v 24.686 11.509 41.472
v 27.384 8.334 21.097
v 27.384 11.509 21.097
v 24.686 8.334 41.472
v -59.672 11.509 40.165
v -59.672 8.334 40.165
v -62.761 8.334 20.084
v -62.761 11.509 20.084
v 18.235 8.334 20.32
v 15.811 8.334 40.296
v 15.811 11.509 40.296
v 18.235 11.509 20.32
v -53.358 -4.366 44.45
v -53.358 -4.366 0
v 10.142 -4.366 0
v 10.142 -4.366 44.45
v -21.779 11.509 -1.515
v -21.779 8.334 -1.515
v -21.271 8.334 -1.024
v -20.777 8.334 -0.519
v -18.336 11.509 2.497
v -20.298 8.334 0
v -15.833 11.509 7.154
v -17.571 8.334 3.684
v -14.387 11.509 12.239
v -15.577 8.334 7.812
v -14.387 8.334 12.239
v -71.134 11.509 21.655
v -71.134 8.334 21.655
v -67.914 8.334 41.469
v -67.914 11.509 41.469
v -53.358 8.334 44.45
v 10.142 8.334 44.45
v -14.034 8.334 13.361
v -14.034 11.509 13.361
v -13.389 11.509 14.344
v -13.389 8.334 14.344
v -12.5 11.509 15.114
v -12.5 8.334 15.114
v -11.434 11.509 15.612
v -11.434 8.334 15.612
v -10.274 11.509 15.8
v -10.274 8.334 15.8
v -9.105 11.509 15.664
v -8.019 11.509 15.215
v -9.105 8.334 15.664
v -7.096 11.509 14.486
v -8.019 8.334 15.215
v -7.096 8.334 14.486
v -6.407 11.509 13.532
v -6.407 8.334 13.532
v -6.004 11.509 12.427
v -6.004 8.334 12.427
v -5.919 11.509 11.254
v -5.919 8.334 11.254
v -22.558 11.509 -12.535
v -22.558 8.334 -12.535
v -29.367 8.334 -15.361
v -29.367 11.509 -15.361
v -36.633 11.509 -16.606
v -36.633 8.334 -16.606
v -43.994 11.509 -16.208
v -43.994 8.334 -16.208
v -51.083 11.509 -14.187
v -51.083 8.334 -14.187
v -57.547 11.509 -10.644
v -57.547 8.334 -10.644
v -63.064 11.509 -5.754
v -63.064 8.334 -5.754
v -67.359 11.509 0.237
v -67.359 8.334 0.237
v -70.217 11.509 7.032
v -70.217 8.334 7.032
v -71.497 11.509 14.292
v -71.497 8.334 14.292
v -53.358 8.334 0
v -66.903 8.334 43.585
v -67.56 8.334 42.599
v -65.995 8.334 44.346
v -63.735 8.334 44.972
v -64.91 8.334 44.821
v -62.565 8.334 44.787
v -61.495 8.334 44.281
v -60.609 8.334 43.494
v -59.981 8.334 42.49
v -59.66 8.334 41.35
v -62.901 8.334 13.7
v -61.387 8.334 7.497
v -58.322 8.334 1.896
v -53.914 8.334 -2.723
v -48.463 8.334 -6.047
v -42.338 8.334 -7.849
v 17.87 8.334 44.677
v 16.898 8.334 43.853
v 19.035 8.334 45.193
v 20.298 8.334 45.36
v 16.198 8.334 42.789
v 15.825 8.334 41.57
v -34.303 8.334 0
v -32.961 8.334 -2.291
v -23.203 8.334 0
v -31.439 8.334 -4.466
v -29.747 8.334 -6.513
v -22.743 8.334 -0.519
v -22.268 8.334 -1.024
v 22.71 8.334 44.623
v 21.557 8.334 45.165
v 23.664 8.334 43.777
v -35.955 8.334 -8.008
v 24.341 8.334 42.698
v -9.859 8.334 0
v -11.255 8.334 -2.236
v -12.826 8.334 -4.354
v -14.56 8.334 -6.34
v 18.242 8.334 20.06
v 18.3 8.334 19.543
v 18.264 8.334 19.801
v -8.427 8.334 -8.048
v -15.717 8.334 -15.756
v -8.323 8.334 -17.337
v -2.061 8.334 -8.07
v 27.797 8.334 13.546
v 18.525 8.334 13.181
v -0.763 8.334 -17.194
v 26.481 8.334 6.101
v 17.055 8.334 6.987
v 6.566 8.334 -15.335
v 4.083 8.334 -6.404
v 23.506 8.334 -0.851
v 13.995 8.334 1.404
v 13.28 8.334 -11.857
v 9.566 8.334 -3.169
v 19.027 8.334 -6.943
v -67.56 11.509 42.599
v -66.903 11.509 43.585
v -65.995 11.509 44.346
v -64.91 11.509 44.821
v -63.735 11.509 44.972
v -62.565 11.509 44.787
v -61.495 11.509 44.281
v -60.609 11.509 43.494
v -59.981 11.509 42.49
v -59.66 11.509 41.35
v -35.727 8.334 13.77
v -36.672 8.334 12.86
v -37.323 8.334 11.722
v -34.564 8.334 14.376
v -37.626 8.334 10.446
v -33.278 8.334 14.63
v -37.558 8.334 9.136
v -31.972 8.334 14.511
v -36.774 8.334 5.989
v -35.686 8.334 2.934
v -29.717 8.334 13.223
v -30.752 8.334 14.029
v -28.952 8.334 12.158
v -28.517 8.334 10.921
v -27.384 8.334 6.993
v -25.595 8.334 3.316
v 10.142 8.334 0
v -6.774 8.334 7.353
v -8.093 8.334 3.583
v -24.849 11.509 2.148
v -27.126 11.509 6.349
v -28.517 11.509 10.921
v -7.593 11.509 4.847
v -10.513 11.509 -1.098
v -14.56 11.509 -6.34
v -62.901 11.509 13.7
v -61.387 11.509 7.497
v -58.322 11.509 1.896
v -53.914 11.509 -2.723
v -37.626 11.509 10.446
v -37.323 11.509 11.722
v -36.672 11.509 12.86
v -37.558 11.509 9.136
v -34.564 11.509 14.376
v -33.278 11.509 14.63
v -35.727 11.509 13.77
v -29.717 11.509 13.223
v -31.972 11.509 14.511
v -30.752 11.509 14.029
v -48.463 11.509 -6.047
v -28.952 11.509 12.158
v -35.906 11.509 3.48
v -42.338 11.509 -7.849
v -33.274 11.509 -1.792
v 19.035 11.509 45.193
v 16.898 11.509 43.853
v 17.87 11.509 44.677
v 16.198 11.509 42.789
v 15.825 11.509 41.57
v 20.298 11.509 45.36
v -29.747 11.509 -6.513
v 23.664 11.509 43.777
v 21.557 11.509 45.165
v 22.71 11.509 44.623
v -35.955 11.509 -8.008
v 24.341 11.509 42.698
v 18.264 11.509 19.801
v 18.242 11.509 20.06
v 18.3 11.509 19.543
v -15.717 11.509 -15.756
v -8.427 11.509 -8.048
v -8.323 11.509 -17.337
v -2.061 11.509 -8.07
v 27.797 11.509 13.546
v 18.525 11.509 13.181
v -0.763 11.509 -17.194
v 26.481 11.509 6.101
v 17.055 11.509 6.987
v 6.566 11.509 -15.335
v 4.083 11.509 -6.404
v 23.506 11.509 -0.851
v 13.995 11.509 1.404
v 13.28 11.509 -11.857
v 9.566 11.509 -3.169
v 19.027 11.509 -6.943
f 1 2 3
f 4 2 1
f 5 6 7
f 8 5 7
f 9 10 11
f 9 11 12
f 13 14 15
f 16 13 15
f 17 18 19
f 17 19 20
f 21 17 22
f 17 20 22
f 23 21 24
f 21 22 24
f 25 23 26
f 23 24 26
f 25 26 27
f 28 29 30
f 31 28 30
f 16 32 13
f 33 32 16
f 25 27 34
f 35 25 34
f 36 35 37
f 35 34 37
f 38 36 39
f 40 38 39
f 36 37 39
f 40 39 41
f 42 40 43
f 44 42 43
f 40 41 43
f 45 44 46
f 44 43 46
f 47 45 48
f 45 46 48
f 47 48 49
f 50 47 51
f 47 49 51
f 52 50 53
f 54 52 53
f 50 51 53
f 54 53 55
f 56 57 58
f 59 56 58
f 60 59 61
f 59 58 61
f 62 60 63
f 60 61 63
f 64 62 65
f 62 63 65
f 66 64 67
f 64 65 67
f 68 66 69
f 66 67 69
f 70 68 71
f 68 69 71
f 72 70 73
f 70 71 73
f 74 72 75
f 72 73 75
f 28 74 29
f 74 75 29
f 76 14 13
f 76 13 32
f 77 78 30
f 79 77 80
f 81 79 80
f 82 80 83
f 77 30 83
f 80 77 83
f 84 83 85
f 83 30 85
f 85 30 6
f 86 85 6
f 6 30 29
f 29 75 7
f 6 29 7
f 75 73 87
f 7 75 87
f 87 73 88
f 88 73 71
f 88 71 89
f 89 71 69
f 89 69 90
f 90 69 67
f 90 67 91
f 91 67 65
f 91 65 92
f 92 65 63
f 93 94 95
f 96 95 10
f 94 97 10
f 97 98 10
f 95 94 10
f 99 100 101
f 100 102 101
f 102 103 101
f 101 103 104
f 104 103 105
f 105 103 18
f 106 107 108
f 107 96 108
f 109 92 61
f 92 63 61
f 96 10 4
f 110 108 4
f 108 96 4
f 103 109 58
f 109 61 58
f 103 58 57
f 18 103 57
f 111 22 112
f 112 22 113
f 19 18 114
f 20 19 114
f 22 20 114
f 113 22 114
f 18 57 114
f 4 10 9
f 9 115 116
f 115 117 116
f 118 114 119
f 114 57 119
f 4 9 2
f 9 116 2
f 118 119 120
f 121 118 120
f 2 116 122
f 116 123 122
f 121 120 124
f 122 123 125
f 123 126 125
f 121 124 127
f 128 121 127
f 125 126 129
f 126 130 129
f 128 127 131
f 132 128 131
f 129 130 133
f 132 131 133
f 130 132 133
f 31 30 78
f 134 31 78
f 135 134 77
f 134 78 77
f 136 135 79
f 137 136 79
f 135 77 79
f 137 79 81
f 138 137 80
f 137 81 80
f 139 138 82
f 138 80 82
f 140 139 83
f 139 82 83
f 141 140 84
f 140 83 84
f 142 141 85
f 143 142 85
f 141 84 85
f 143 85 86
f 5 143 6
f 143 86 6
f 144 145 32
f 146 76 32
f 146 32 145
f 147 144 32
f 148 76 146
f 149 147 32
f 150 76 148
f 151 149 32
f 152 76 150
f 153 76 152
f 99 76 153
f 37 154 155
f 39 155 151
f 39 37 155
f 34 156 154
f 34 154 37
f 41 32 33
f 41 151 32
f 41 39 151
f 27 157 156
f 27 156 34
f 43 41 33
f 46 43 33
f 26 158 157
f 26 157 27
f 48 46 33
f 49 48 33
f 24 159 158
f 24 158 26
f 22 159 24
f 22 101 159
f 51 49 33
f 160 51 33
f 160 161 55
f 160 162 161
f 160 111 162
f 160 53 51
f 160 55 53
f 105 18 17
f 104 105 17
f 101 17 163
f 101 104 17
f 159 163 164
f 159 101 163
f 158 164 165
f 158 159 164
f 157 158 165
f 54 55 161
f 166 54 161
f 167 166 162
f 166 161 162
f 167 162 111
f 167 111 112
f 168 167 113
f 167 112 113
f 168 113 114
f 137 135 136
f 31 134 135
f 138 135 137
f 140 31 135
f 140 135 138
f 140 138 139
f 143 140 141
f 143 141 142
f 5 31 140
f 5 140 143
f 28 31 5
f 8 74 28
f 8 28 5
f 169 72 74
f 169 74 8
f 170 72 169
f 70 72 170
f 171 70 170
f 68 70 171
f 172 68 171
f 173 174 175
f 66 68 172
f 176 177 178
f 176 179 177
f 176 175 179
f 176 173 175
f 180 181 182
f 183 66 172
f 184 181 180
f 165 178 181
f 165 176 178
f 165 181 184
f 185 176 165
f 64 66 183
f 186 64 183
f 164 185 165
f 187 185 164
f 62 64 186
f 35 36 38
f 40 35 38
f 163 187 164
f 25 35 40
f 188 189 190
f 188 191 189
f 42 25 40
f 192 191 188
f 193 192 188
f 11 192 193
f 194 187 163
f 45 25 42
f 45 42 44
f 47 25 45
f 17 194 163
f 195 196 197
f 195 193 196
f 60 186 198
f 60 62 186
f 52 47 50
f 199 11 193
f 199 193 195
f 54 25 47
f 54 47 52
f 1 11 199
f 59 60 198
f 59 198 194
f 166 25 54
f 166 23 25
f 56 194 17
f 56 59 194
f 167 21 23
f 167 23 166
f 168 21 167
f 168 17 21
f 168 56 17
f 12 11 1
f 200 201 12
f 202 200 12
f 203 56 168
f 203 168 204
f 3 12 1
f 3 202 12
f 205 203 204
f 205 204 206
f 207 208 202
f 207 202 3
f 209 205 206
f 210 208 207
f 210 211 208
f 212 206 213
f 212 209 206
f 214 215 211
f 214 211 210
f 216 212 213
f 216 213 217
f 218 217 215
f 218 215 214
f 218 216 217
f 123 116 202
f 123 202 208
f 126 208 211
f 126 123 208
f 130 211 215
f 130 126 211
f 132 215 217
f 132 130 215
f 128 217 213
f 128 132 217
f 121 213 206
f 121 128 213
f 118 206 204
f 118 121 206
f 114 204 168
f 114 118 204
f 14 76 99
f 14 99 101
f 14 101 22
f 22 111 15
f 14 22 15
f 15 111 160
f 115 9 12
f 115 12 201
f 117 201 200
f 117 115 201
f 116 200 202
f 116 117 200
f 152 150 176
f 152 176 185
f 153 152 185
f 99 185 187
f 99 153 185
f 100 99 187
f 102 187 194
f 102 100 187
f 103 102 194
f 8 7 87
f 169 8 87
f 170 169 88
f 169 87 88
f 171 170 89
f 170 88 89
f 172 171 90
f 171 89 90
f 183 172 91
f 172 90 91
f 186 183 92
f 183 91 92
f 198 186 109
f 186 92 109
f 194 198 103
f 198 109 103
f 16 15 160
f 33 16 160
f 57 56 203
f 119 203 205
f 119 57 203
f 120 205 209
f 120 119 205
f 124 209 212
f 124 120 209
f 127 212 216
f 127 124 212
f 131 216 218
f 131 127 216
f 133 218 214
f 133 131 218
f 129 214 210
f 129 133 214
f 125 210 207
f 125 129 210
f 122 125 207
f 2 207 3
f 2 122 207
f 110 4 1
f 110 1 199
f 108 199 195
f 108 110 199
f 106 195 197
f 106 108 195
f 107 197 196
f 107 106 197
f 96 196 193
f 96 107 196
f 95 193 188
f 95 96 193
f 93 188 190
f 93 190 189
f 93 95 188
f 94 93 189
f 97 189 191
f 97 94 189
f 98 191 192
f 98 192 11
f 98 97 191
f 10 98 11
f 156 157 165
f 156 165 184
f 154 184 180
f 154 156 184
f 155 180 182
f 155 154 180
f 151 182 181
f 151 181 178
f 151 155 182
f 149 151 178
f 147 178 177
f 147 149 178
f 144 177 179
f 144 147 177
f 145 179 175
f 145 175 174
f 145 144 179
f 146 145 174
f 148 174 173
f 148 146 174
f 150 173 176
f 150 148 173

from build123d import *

# Parameters (mm, degrees)
SKETCH2_W           = 63.5
SKETCH2_H           = 12.7
BOSS_EXTRUDE1_DEPTH = 44.45
BOSS_EXTRUDE2_DEPTH = 3.175
SKETCH2_2_W         = 63.5
SKETCH2_2_H         = 12.7
BOSS_EXTRUDE3_DEPTH = 3.175
BOSS_EXTRUDE4_DEPTH = 3.175


with BuildPart() as part:
    # Sketch2 → Boss-Extrude1 (new body)
    with BuildSketch(Plane.XY):
        with Locations((-21.607638889, 1.984375)):
            Rectangle(SKETCH2_W, SKETCH2_H)
    extrude(amount=BOSS_EXTRUDE1_DEPTH)

    # Sketch3 → Boss-Extrude2 (add)
    with BuildSketch(Plane(origin=(0, 8.334375, 0), x_dir=(1, 0, 0), z_dir=(0, 1, 0))):
        with BuildLine():
            Line((27.384230149, -21.096568897), (24.686230398, -41.471557028))
            ThreePointArc((24.686230398, -41.471557028), (19.660883481, -45.321643523), (15.810796986, -40.296296607))
            Line((15.810796986, -40.296296607), (18.234581428, -20.32))
            ThreePointArc((18.234581428, -20.32), (18.251088657, -19.930319533), (18.300492073, -19.543431103))
            ThreePointArc((18.300492073, -19.543431103), (-0.851865875, 7.879150717), (-28.517114145, -10.920978184))
            ThreePointArc((-28.517114145, -10.920978184), (-33.930101581, -14.549040236), (-37.558163632, -9.136052801))
            ThreePointArc((-37.558163632, -9.136052801), (0.817302189, 16.942285518), (27.384230149, -21.096568897))
        make_face()
    extrude(amount=BOSS_EXTRUDE2_DEPTH)

    # Sketch2<2> → Boss-Extrude3 (add)
    with BuildSketch(Plane.XY):
        with Locations((-21.607638889, 1.984375)):
            Rectangle(SKETCH2_2_W, SKETCH2_2_H)
    extrude(amount=BOSS_EXTRUDE3_DEPTH)

    # Sketch6 → Boss-Extrude4 (add)
    with BuildSketch(Plane(origin=(0, 8.334375, 0), x_dir=(1, 0, 0), z_dir=(0, 1, 0))):
        with BuildLine():
            Line((-71.134197224, -21.655068851), (-67.914165266, -41.469070044))
            ThreePointArc((-67.914165266, -41.469070044), (-63.143827484, -44.92106421), (-59.671631072, -40.165410907))
            Line((-59.671631072, -40.165410907), (-62.760560613, -20.083656097))
            ThreePointArc((-62.760560613, -20.083656097), (-42.464339717, 7.82922996), (-14.386949358, -12.238802862))
            ThreePointArc((-14.386949358, -12.238802862), (-9.684746174, -15.772440511), (-5.918655002, -11.254269741))
            ThreePointArc((-5.918655002, -11.254269741), (-43.742205026, 16.249534133), (-71.134197224, -21.655068851))
        make_face()
    extrude(amount=BOSS_EXTRUDE4_DEPTH)


solid = part.part
